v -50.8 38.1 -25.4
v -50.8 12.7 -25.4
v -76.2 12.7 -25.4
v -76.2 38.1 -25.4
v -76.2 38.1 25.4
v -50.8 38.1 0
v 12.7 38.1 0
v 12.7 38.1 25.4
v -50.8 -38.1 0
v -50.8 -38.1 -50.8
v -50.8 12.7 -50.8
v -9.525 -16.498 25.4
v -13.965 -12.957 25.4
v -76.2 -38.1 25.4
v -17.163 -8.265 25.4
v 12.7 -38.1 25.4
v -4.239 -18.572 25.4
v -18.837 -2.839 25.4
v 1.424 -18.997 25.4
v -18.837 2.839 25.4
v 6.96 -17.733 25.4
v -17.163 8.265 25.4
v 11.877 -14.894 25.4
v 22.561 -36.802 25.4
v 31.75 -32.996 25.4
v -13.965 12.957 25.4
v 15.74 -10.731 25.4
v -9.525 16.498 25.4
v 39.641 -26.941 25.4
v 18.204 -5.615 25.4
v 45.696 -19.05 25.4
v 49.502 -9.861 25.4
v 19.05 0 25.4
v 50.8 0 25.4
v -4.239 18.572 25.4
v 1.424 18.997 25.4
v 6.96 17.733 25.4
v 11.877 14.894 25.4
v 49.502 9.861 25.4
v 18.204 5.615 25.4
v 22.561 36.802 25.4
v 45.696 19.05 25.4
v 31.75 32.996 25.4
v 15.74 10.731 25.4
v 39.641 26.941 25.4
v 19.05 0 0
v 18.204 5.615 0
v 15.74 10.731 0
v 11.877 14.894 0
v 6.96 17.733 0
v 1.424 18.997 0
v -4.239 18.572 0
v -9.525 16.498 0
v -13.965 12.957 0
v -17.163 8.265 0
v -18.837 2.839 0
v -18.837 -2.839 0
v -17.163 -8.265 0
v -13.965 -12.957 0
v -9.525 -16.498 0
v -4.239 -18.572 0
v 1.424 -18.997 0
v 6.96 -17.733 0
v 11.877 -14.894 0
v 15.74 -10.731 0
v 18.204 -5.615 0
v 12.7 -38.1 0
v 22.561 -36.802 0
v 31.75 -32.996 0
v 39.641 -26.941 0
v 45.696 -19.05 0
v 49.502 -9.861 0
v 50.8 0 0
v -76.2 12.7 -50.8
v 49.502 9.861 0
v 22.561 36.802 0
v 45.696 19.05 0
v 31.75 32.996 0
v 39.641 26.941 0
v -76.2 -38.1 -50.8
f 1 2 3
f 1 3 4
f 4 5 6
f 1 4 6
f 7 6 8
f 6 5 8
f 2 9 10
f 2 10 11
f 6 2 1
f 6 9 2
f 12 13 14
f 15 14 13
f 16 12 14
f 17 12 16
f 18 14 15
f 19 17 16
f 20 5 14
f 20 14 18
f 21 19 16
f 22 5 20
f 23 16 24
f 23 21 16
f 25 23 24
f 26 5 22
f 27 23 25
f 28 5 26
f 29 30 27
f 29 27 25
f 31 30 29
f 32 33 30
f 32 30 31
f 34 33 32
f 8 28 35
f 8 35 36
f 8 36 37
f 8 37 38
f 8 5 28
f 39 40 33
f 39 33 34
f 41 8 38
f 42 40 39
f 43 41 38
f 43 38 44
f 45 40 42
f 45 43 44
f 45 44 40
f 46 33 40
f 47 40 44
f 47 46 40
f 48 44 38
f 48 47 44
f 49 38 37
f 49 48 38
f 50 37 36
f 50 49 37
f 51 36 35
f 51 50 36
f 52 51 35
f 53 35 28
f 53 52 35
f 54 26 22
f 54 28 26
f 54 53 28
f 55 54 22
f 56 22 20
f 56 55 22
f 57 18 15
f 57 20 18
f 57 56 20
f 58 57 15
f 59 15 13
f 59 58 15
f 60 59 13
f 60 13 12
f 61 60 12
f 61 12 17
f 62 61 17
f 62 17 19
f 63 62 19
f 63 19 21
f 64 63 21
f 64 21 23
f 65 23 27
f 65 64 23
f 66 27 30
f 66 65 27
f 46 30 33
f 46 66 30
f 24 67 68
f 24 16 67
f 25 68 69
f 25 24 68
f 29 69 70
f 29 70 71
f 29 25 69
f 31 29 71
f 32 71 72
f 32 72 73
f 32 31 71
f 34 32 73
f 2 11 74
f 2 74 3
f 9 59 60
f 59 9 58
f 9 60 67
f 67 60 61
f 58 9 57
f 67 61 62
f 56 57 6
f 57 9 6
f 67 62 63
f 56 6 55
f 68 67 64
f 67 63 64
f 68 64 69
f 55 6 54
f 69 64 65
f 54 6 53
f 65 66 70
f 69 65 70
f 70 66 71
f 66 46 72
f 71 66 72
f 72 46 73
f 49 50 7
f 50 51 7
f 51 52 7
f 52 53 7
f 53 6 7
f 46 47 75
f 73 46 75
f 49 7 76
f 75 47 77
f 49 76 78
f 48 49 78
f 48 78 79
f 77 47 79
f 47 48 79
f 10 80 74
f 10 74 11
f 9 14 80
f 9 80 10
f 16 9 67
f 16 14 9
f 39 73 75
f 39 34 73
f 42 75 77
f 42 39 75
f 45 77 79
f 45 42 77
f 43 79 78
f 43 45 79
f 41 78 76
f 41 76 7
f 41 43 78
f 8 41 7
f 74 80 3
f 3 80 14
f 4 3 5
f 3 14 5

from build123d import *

# Parameters (mm, degrees)
F0_W     = 101.6
F0_H     = 76.2
F1_DEPTH = 25.4
F2_R     = 38.09999
F3_R     = 19.05
F4_DEPTH = 25.401
F5_W     = 25.4
F5_H     = 76.2
F6_DEPTH = 76.2
F7_W     = 25.4
F7_H     = 25.4
F8_DEPTH = 25.4


# Not quite as in the source:
# - a fillet or chamfer is up to 0.001 mm smaller than in the source, because OpenCascade refuses the exact size


with BuildPart() as f1:
    # F0 (on Top) → F1 (new body)
    with BuildSketch(Plane.XY):
        Rectangle(F0_W, F0_H)
    extrude(amount=F1_DEPTH)

    # F2 (radius 38.1 in the source; OpenCascade refuses exactly that, so slightly less here)
    f2_edges = [f1.edges().sort_by_distance(p)[0] for p in [
        (50.8, -38.1, 12.7),
        (50.8, 38.1, 12.7),
    ]]
    fillet(f2_edges, radius=F2_R)

    # F3 (on Top) → F4 (cut, through all)
    with BuildSketch(Plane.XY):
        Circle(F3_R)
    extrude(amount=F4_DEPTH, mode=Mode.SUBTRACT)

    # F5 (on face) → F6 (join)
    with BuildSketch(Plane.XY.offset(25.4)):
        with Locations((-63.5, 0)):
            Rectangle(F5_W, F5_H)
    extrude(amount=-F6_DEPTH)

    # F7 (on face) → F8 (cut)
    with BuildSketch(Plane.YZ.offset(-50.8)):
        with Locations((25.4, -38.1)):
            Rectangle(F7_W, F7_H)
    extrude(amount=-F8_DEPTH, mode=Mode.SUBTRACT)


solid = f1.part
